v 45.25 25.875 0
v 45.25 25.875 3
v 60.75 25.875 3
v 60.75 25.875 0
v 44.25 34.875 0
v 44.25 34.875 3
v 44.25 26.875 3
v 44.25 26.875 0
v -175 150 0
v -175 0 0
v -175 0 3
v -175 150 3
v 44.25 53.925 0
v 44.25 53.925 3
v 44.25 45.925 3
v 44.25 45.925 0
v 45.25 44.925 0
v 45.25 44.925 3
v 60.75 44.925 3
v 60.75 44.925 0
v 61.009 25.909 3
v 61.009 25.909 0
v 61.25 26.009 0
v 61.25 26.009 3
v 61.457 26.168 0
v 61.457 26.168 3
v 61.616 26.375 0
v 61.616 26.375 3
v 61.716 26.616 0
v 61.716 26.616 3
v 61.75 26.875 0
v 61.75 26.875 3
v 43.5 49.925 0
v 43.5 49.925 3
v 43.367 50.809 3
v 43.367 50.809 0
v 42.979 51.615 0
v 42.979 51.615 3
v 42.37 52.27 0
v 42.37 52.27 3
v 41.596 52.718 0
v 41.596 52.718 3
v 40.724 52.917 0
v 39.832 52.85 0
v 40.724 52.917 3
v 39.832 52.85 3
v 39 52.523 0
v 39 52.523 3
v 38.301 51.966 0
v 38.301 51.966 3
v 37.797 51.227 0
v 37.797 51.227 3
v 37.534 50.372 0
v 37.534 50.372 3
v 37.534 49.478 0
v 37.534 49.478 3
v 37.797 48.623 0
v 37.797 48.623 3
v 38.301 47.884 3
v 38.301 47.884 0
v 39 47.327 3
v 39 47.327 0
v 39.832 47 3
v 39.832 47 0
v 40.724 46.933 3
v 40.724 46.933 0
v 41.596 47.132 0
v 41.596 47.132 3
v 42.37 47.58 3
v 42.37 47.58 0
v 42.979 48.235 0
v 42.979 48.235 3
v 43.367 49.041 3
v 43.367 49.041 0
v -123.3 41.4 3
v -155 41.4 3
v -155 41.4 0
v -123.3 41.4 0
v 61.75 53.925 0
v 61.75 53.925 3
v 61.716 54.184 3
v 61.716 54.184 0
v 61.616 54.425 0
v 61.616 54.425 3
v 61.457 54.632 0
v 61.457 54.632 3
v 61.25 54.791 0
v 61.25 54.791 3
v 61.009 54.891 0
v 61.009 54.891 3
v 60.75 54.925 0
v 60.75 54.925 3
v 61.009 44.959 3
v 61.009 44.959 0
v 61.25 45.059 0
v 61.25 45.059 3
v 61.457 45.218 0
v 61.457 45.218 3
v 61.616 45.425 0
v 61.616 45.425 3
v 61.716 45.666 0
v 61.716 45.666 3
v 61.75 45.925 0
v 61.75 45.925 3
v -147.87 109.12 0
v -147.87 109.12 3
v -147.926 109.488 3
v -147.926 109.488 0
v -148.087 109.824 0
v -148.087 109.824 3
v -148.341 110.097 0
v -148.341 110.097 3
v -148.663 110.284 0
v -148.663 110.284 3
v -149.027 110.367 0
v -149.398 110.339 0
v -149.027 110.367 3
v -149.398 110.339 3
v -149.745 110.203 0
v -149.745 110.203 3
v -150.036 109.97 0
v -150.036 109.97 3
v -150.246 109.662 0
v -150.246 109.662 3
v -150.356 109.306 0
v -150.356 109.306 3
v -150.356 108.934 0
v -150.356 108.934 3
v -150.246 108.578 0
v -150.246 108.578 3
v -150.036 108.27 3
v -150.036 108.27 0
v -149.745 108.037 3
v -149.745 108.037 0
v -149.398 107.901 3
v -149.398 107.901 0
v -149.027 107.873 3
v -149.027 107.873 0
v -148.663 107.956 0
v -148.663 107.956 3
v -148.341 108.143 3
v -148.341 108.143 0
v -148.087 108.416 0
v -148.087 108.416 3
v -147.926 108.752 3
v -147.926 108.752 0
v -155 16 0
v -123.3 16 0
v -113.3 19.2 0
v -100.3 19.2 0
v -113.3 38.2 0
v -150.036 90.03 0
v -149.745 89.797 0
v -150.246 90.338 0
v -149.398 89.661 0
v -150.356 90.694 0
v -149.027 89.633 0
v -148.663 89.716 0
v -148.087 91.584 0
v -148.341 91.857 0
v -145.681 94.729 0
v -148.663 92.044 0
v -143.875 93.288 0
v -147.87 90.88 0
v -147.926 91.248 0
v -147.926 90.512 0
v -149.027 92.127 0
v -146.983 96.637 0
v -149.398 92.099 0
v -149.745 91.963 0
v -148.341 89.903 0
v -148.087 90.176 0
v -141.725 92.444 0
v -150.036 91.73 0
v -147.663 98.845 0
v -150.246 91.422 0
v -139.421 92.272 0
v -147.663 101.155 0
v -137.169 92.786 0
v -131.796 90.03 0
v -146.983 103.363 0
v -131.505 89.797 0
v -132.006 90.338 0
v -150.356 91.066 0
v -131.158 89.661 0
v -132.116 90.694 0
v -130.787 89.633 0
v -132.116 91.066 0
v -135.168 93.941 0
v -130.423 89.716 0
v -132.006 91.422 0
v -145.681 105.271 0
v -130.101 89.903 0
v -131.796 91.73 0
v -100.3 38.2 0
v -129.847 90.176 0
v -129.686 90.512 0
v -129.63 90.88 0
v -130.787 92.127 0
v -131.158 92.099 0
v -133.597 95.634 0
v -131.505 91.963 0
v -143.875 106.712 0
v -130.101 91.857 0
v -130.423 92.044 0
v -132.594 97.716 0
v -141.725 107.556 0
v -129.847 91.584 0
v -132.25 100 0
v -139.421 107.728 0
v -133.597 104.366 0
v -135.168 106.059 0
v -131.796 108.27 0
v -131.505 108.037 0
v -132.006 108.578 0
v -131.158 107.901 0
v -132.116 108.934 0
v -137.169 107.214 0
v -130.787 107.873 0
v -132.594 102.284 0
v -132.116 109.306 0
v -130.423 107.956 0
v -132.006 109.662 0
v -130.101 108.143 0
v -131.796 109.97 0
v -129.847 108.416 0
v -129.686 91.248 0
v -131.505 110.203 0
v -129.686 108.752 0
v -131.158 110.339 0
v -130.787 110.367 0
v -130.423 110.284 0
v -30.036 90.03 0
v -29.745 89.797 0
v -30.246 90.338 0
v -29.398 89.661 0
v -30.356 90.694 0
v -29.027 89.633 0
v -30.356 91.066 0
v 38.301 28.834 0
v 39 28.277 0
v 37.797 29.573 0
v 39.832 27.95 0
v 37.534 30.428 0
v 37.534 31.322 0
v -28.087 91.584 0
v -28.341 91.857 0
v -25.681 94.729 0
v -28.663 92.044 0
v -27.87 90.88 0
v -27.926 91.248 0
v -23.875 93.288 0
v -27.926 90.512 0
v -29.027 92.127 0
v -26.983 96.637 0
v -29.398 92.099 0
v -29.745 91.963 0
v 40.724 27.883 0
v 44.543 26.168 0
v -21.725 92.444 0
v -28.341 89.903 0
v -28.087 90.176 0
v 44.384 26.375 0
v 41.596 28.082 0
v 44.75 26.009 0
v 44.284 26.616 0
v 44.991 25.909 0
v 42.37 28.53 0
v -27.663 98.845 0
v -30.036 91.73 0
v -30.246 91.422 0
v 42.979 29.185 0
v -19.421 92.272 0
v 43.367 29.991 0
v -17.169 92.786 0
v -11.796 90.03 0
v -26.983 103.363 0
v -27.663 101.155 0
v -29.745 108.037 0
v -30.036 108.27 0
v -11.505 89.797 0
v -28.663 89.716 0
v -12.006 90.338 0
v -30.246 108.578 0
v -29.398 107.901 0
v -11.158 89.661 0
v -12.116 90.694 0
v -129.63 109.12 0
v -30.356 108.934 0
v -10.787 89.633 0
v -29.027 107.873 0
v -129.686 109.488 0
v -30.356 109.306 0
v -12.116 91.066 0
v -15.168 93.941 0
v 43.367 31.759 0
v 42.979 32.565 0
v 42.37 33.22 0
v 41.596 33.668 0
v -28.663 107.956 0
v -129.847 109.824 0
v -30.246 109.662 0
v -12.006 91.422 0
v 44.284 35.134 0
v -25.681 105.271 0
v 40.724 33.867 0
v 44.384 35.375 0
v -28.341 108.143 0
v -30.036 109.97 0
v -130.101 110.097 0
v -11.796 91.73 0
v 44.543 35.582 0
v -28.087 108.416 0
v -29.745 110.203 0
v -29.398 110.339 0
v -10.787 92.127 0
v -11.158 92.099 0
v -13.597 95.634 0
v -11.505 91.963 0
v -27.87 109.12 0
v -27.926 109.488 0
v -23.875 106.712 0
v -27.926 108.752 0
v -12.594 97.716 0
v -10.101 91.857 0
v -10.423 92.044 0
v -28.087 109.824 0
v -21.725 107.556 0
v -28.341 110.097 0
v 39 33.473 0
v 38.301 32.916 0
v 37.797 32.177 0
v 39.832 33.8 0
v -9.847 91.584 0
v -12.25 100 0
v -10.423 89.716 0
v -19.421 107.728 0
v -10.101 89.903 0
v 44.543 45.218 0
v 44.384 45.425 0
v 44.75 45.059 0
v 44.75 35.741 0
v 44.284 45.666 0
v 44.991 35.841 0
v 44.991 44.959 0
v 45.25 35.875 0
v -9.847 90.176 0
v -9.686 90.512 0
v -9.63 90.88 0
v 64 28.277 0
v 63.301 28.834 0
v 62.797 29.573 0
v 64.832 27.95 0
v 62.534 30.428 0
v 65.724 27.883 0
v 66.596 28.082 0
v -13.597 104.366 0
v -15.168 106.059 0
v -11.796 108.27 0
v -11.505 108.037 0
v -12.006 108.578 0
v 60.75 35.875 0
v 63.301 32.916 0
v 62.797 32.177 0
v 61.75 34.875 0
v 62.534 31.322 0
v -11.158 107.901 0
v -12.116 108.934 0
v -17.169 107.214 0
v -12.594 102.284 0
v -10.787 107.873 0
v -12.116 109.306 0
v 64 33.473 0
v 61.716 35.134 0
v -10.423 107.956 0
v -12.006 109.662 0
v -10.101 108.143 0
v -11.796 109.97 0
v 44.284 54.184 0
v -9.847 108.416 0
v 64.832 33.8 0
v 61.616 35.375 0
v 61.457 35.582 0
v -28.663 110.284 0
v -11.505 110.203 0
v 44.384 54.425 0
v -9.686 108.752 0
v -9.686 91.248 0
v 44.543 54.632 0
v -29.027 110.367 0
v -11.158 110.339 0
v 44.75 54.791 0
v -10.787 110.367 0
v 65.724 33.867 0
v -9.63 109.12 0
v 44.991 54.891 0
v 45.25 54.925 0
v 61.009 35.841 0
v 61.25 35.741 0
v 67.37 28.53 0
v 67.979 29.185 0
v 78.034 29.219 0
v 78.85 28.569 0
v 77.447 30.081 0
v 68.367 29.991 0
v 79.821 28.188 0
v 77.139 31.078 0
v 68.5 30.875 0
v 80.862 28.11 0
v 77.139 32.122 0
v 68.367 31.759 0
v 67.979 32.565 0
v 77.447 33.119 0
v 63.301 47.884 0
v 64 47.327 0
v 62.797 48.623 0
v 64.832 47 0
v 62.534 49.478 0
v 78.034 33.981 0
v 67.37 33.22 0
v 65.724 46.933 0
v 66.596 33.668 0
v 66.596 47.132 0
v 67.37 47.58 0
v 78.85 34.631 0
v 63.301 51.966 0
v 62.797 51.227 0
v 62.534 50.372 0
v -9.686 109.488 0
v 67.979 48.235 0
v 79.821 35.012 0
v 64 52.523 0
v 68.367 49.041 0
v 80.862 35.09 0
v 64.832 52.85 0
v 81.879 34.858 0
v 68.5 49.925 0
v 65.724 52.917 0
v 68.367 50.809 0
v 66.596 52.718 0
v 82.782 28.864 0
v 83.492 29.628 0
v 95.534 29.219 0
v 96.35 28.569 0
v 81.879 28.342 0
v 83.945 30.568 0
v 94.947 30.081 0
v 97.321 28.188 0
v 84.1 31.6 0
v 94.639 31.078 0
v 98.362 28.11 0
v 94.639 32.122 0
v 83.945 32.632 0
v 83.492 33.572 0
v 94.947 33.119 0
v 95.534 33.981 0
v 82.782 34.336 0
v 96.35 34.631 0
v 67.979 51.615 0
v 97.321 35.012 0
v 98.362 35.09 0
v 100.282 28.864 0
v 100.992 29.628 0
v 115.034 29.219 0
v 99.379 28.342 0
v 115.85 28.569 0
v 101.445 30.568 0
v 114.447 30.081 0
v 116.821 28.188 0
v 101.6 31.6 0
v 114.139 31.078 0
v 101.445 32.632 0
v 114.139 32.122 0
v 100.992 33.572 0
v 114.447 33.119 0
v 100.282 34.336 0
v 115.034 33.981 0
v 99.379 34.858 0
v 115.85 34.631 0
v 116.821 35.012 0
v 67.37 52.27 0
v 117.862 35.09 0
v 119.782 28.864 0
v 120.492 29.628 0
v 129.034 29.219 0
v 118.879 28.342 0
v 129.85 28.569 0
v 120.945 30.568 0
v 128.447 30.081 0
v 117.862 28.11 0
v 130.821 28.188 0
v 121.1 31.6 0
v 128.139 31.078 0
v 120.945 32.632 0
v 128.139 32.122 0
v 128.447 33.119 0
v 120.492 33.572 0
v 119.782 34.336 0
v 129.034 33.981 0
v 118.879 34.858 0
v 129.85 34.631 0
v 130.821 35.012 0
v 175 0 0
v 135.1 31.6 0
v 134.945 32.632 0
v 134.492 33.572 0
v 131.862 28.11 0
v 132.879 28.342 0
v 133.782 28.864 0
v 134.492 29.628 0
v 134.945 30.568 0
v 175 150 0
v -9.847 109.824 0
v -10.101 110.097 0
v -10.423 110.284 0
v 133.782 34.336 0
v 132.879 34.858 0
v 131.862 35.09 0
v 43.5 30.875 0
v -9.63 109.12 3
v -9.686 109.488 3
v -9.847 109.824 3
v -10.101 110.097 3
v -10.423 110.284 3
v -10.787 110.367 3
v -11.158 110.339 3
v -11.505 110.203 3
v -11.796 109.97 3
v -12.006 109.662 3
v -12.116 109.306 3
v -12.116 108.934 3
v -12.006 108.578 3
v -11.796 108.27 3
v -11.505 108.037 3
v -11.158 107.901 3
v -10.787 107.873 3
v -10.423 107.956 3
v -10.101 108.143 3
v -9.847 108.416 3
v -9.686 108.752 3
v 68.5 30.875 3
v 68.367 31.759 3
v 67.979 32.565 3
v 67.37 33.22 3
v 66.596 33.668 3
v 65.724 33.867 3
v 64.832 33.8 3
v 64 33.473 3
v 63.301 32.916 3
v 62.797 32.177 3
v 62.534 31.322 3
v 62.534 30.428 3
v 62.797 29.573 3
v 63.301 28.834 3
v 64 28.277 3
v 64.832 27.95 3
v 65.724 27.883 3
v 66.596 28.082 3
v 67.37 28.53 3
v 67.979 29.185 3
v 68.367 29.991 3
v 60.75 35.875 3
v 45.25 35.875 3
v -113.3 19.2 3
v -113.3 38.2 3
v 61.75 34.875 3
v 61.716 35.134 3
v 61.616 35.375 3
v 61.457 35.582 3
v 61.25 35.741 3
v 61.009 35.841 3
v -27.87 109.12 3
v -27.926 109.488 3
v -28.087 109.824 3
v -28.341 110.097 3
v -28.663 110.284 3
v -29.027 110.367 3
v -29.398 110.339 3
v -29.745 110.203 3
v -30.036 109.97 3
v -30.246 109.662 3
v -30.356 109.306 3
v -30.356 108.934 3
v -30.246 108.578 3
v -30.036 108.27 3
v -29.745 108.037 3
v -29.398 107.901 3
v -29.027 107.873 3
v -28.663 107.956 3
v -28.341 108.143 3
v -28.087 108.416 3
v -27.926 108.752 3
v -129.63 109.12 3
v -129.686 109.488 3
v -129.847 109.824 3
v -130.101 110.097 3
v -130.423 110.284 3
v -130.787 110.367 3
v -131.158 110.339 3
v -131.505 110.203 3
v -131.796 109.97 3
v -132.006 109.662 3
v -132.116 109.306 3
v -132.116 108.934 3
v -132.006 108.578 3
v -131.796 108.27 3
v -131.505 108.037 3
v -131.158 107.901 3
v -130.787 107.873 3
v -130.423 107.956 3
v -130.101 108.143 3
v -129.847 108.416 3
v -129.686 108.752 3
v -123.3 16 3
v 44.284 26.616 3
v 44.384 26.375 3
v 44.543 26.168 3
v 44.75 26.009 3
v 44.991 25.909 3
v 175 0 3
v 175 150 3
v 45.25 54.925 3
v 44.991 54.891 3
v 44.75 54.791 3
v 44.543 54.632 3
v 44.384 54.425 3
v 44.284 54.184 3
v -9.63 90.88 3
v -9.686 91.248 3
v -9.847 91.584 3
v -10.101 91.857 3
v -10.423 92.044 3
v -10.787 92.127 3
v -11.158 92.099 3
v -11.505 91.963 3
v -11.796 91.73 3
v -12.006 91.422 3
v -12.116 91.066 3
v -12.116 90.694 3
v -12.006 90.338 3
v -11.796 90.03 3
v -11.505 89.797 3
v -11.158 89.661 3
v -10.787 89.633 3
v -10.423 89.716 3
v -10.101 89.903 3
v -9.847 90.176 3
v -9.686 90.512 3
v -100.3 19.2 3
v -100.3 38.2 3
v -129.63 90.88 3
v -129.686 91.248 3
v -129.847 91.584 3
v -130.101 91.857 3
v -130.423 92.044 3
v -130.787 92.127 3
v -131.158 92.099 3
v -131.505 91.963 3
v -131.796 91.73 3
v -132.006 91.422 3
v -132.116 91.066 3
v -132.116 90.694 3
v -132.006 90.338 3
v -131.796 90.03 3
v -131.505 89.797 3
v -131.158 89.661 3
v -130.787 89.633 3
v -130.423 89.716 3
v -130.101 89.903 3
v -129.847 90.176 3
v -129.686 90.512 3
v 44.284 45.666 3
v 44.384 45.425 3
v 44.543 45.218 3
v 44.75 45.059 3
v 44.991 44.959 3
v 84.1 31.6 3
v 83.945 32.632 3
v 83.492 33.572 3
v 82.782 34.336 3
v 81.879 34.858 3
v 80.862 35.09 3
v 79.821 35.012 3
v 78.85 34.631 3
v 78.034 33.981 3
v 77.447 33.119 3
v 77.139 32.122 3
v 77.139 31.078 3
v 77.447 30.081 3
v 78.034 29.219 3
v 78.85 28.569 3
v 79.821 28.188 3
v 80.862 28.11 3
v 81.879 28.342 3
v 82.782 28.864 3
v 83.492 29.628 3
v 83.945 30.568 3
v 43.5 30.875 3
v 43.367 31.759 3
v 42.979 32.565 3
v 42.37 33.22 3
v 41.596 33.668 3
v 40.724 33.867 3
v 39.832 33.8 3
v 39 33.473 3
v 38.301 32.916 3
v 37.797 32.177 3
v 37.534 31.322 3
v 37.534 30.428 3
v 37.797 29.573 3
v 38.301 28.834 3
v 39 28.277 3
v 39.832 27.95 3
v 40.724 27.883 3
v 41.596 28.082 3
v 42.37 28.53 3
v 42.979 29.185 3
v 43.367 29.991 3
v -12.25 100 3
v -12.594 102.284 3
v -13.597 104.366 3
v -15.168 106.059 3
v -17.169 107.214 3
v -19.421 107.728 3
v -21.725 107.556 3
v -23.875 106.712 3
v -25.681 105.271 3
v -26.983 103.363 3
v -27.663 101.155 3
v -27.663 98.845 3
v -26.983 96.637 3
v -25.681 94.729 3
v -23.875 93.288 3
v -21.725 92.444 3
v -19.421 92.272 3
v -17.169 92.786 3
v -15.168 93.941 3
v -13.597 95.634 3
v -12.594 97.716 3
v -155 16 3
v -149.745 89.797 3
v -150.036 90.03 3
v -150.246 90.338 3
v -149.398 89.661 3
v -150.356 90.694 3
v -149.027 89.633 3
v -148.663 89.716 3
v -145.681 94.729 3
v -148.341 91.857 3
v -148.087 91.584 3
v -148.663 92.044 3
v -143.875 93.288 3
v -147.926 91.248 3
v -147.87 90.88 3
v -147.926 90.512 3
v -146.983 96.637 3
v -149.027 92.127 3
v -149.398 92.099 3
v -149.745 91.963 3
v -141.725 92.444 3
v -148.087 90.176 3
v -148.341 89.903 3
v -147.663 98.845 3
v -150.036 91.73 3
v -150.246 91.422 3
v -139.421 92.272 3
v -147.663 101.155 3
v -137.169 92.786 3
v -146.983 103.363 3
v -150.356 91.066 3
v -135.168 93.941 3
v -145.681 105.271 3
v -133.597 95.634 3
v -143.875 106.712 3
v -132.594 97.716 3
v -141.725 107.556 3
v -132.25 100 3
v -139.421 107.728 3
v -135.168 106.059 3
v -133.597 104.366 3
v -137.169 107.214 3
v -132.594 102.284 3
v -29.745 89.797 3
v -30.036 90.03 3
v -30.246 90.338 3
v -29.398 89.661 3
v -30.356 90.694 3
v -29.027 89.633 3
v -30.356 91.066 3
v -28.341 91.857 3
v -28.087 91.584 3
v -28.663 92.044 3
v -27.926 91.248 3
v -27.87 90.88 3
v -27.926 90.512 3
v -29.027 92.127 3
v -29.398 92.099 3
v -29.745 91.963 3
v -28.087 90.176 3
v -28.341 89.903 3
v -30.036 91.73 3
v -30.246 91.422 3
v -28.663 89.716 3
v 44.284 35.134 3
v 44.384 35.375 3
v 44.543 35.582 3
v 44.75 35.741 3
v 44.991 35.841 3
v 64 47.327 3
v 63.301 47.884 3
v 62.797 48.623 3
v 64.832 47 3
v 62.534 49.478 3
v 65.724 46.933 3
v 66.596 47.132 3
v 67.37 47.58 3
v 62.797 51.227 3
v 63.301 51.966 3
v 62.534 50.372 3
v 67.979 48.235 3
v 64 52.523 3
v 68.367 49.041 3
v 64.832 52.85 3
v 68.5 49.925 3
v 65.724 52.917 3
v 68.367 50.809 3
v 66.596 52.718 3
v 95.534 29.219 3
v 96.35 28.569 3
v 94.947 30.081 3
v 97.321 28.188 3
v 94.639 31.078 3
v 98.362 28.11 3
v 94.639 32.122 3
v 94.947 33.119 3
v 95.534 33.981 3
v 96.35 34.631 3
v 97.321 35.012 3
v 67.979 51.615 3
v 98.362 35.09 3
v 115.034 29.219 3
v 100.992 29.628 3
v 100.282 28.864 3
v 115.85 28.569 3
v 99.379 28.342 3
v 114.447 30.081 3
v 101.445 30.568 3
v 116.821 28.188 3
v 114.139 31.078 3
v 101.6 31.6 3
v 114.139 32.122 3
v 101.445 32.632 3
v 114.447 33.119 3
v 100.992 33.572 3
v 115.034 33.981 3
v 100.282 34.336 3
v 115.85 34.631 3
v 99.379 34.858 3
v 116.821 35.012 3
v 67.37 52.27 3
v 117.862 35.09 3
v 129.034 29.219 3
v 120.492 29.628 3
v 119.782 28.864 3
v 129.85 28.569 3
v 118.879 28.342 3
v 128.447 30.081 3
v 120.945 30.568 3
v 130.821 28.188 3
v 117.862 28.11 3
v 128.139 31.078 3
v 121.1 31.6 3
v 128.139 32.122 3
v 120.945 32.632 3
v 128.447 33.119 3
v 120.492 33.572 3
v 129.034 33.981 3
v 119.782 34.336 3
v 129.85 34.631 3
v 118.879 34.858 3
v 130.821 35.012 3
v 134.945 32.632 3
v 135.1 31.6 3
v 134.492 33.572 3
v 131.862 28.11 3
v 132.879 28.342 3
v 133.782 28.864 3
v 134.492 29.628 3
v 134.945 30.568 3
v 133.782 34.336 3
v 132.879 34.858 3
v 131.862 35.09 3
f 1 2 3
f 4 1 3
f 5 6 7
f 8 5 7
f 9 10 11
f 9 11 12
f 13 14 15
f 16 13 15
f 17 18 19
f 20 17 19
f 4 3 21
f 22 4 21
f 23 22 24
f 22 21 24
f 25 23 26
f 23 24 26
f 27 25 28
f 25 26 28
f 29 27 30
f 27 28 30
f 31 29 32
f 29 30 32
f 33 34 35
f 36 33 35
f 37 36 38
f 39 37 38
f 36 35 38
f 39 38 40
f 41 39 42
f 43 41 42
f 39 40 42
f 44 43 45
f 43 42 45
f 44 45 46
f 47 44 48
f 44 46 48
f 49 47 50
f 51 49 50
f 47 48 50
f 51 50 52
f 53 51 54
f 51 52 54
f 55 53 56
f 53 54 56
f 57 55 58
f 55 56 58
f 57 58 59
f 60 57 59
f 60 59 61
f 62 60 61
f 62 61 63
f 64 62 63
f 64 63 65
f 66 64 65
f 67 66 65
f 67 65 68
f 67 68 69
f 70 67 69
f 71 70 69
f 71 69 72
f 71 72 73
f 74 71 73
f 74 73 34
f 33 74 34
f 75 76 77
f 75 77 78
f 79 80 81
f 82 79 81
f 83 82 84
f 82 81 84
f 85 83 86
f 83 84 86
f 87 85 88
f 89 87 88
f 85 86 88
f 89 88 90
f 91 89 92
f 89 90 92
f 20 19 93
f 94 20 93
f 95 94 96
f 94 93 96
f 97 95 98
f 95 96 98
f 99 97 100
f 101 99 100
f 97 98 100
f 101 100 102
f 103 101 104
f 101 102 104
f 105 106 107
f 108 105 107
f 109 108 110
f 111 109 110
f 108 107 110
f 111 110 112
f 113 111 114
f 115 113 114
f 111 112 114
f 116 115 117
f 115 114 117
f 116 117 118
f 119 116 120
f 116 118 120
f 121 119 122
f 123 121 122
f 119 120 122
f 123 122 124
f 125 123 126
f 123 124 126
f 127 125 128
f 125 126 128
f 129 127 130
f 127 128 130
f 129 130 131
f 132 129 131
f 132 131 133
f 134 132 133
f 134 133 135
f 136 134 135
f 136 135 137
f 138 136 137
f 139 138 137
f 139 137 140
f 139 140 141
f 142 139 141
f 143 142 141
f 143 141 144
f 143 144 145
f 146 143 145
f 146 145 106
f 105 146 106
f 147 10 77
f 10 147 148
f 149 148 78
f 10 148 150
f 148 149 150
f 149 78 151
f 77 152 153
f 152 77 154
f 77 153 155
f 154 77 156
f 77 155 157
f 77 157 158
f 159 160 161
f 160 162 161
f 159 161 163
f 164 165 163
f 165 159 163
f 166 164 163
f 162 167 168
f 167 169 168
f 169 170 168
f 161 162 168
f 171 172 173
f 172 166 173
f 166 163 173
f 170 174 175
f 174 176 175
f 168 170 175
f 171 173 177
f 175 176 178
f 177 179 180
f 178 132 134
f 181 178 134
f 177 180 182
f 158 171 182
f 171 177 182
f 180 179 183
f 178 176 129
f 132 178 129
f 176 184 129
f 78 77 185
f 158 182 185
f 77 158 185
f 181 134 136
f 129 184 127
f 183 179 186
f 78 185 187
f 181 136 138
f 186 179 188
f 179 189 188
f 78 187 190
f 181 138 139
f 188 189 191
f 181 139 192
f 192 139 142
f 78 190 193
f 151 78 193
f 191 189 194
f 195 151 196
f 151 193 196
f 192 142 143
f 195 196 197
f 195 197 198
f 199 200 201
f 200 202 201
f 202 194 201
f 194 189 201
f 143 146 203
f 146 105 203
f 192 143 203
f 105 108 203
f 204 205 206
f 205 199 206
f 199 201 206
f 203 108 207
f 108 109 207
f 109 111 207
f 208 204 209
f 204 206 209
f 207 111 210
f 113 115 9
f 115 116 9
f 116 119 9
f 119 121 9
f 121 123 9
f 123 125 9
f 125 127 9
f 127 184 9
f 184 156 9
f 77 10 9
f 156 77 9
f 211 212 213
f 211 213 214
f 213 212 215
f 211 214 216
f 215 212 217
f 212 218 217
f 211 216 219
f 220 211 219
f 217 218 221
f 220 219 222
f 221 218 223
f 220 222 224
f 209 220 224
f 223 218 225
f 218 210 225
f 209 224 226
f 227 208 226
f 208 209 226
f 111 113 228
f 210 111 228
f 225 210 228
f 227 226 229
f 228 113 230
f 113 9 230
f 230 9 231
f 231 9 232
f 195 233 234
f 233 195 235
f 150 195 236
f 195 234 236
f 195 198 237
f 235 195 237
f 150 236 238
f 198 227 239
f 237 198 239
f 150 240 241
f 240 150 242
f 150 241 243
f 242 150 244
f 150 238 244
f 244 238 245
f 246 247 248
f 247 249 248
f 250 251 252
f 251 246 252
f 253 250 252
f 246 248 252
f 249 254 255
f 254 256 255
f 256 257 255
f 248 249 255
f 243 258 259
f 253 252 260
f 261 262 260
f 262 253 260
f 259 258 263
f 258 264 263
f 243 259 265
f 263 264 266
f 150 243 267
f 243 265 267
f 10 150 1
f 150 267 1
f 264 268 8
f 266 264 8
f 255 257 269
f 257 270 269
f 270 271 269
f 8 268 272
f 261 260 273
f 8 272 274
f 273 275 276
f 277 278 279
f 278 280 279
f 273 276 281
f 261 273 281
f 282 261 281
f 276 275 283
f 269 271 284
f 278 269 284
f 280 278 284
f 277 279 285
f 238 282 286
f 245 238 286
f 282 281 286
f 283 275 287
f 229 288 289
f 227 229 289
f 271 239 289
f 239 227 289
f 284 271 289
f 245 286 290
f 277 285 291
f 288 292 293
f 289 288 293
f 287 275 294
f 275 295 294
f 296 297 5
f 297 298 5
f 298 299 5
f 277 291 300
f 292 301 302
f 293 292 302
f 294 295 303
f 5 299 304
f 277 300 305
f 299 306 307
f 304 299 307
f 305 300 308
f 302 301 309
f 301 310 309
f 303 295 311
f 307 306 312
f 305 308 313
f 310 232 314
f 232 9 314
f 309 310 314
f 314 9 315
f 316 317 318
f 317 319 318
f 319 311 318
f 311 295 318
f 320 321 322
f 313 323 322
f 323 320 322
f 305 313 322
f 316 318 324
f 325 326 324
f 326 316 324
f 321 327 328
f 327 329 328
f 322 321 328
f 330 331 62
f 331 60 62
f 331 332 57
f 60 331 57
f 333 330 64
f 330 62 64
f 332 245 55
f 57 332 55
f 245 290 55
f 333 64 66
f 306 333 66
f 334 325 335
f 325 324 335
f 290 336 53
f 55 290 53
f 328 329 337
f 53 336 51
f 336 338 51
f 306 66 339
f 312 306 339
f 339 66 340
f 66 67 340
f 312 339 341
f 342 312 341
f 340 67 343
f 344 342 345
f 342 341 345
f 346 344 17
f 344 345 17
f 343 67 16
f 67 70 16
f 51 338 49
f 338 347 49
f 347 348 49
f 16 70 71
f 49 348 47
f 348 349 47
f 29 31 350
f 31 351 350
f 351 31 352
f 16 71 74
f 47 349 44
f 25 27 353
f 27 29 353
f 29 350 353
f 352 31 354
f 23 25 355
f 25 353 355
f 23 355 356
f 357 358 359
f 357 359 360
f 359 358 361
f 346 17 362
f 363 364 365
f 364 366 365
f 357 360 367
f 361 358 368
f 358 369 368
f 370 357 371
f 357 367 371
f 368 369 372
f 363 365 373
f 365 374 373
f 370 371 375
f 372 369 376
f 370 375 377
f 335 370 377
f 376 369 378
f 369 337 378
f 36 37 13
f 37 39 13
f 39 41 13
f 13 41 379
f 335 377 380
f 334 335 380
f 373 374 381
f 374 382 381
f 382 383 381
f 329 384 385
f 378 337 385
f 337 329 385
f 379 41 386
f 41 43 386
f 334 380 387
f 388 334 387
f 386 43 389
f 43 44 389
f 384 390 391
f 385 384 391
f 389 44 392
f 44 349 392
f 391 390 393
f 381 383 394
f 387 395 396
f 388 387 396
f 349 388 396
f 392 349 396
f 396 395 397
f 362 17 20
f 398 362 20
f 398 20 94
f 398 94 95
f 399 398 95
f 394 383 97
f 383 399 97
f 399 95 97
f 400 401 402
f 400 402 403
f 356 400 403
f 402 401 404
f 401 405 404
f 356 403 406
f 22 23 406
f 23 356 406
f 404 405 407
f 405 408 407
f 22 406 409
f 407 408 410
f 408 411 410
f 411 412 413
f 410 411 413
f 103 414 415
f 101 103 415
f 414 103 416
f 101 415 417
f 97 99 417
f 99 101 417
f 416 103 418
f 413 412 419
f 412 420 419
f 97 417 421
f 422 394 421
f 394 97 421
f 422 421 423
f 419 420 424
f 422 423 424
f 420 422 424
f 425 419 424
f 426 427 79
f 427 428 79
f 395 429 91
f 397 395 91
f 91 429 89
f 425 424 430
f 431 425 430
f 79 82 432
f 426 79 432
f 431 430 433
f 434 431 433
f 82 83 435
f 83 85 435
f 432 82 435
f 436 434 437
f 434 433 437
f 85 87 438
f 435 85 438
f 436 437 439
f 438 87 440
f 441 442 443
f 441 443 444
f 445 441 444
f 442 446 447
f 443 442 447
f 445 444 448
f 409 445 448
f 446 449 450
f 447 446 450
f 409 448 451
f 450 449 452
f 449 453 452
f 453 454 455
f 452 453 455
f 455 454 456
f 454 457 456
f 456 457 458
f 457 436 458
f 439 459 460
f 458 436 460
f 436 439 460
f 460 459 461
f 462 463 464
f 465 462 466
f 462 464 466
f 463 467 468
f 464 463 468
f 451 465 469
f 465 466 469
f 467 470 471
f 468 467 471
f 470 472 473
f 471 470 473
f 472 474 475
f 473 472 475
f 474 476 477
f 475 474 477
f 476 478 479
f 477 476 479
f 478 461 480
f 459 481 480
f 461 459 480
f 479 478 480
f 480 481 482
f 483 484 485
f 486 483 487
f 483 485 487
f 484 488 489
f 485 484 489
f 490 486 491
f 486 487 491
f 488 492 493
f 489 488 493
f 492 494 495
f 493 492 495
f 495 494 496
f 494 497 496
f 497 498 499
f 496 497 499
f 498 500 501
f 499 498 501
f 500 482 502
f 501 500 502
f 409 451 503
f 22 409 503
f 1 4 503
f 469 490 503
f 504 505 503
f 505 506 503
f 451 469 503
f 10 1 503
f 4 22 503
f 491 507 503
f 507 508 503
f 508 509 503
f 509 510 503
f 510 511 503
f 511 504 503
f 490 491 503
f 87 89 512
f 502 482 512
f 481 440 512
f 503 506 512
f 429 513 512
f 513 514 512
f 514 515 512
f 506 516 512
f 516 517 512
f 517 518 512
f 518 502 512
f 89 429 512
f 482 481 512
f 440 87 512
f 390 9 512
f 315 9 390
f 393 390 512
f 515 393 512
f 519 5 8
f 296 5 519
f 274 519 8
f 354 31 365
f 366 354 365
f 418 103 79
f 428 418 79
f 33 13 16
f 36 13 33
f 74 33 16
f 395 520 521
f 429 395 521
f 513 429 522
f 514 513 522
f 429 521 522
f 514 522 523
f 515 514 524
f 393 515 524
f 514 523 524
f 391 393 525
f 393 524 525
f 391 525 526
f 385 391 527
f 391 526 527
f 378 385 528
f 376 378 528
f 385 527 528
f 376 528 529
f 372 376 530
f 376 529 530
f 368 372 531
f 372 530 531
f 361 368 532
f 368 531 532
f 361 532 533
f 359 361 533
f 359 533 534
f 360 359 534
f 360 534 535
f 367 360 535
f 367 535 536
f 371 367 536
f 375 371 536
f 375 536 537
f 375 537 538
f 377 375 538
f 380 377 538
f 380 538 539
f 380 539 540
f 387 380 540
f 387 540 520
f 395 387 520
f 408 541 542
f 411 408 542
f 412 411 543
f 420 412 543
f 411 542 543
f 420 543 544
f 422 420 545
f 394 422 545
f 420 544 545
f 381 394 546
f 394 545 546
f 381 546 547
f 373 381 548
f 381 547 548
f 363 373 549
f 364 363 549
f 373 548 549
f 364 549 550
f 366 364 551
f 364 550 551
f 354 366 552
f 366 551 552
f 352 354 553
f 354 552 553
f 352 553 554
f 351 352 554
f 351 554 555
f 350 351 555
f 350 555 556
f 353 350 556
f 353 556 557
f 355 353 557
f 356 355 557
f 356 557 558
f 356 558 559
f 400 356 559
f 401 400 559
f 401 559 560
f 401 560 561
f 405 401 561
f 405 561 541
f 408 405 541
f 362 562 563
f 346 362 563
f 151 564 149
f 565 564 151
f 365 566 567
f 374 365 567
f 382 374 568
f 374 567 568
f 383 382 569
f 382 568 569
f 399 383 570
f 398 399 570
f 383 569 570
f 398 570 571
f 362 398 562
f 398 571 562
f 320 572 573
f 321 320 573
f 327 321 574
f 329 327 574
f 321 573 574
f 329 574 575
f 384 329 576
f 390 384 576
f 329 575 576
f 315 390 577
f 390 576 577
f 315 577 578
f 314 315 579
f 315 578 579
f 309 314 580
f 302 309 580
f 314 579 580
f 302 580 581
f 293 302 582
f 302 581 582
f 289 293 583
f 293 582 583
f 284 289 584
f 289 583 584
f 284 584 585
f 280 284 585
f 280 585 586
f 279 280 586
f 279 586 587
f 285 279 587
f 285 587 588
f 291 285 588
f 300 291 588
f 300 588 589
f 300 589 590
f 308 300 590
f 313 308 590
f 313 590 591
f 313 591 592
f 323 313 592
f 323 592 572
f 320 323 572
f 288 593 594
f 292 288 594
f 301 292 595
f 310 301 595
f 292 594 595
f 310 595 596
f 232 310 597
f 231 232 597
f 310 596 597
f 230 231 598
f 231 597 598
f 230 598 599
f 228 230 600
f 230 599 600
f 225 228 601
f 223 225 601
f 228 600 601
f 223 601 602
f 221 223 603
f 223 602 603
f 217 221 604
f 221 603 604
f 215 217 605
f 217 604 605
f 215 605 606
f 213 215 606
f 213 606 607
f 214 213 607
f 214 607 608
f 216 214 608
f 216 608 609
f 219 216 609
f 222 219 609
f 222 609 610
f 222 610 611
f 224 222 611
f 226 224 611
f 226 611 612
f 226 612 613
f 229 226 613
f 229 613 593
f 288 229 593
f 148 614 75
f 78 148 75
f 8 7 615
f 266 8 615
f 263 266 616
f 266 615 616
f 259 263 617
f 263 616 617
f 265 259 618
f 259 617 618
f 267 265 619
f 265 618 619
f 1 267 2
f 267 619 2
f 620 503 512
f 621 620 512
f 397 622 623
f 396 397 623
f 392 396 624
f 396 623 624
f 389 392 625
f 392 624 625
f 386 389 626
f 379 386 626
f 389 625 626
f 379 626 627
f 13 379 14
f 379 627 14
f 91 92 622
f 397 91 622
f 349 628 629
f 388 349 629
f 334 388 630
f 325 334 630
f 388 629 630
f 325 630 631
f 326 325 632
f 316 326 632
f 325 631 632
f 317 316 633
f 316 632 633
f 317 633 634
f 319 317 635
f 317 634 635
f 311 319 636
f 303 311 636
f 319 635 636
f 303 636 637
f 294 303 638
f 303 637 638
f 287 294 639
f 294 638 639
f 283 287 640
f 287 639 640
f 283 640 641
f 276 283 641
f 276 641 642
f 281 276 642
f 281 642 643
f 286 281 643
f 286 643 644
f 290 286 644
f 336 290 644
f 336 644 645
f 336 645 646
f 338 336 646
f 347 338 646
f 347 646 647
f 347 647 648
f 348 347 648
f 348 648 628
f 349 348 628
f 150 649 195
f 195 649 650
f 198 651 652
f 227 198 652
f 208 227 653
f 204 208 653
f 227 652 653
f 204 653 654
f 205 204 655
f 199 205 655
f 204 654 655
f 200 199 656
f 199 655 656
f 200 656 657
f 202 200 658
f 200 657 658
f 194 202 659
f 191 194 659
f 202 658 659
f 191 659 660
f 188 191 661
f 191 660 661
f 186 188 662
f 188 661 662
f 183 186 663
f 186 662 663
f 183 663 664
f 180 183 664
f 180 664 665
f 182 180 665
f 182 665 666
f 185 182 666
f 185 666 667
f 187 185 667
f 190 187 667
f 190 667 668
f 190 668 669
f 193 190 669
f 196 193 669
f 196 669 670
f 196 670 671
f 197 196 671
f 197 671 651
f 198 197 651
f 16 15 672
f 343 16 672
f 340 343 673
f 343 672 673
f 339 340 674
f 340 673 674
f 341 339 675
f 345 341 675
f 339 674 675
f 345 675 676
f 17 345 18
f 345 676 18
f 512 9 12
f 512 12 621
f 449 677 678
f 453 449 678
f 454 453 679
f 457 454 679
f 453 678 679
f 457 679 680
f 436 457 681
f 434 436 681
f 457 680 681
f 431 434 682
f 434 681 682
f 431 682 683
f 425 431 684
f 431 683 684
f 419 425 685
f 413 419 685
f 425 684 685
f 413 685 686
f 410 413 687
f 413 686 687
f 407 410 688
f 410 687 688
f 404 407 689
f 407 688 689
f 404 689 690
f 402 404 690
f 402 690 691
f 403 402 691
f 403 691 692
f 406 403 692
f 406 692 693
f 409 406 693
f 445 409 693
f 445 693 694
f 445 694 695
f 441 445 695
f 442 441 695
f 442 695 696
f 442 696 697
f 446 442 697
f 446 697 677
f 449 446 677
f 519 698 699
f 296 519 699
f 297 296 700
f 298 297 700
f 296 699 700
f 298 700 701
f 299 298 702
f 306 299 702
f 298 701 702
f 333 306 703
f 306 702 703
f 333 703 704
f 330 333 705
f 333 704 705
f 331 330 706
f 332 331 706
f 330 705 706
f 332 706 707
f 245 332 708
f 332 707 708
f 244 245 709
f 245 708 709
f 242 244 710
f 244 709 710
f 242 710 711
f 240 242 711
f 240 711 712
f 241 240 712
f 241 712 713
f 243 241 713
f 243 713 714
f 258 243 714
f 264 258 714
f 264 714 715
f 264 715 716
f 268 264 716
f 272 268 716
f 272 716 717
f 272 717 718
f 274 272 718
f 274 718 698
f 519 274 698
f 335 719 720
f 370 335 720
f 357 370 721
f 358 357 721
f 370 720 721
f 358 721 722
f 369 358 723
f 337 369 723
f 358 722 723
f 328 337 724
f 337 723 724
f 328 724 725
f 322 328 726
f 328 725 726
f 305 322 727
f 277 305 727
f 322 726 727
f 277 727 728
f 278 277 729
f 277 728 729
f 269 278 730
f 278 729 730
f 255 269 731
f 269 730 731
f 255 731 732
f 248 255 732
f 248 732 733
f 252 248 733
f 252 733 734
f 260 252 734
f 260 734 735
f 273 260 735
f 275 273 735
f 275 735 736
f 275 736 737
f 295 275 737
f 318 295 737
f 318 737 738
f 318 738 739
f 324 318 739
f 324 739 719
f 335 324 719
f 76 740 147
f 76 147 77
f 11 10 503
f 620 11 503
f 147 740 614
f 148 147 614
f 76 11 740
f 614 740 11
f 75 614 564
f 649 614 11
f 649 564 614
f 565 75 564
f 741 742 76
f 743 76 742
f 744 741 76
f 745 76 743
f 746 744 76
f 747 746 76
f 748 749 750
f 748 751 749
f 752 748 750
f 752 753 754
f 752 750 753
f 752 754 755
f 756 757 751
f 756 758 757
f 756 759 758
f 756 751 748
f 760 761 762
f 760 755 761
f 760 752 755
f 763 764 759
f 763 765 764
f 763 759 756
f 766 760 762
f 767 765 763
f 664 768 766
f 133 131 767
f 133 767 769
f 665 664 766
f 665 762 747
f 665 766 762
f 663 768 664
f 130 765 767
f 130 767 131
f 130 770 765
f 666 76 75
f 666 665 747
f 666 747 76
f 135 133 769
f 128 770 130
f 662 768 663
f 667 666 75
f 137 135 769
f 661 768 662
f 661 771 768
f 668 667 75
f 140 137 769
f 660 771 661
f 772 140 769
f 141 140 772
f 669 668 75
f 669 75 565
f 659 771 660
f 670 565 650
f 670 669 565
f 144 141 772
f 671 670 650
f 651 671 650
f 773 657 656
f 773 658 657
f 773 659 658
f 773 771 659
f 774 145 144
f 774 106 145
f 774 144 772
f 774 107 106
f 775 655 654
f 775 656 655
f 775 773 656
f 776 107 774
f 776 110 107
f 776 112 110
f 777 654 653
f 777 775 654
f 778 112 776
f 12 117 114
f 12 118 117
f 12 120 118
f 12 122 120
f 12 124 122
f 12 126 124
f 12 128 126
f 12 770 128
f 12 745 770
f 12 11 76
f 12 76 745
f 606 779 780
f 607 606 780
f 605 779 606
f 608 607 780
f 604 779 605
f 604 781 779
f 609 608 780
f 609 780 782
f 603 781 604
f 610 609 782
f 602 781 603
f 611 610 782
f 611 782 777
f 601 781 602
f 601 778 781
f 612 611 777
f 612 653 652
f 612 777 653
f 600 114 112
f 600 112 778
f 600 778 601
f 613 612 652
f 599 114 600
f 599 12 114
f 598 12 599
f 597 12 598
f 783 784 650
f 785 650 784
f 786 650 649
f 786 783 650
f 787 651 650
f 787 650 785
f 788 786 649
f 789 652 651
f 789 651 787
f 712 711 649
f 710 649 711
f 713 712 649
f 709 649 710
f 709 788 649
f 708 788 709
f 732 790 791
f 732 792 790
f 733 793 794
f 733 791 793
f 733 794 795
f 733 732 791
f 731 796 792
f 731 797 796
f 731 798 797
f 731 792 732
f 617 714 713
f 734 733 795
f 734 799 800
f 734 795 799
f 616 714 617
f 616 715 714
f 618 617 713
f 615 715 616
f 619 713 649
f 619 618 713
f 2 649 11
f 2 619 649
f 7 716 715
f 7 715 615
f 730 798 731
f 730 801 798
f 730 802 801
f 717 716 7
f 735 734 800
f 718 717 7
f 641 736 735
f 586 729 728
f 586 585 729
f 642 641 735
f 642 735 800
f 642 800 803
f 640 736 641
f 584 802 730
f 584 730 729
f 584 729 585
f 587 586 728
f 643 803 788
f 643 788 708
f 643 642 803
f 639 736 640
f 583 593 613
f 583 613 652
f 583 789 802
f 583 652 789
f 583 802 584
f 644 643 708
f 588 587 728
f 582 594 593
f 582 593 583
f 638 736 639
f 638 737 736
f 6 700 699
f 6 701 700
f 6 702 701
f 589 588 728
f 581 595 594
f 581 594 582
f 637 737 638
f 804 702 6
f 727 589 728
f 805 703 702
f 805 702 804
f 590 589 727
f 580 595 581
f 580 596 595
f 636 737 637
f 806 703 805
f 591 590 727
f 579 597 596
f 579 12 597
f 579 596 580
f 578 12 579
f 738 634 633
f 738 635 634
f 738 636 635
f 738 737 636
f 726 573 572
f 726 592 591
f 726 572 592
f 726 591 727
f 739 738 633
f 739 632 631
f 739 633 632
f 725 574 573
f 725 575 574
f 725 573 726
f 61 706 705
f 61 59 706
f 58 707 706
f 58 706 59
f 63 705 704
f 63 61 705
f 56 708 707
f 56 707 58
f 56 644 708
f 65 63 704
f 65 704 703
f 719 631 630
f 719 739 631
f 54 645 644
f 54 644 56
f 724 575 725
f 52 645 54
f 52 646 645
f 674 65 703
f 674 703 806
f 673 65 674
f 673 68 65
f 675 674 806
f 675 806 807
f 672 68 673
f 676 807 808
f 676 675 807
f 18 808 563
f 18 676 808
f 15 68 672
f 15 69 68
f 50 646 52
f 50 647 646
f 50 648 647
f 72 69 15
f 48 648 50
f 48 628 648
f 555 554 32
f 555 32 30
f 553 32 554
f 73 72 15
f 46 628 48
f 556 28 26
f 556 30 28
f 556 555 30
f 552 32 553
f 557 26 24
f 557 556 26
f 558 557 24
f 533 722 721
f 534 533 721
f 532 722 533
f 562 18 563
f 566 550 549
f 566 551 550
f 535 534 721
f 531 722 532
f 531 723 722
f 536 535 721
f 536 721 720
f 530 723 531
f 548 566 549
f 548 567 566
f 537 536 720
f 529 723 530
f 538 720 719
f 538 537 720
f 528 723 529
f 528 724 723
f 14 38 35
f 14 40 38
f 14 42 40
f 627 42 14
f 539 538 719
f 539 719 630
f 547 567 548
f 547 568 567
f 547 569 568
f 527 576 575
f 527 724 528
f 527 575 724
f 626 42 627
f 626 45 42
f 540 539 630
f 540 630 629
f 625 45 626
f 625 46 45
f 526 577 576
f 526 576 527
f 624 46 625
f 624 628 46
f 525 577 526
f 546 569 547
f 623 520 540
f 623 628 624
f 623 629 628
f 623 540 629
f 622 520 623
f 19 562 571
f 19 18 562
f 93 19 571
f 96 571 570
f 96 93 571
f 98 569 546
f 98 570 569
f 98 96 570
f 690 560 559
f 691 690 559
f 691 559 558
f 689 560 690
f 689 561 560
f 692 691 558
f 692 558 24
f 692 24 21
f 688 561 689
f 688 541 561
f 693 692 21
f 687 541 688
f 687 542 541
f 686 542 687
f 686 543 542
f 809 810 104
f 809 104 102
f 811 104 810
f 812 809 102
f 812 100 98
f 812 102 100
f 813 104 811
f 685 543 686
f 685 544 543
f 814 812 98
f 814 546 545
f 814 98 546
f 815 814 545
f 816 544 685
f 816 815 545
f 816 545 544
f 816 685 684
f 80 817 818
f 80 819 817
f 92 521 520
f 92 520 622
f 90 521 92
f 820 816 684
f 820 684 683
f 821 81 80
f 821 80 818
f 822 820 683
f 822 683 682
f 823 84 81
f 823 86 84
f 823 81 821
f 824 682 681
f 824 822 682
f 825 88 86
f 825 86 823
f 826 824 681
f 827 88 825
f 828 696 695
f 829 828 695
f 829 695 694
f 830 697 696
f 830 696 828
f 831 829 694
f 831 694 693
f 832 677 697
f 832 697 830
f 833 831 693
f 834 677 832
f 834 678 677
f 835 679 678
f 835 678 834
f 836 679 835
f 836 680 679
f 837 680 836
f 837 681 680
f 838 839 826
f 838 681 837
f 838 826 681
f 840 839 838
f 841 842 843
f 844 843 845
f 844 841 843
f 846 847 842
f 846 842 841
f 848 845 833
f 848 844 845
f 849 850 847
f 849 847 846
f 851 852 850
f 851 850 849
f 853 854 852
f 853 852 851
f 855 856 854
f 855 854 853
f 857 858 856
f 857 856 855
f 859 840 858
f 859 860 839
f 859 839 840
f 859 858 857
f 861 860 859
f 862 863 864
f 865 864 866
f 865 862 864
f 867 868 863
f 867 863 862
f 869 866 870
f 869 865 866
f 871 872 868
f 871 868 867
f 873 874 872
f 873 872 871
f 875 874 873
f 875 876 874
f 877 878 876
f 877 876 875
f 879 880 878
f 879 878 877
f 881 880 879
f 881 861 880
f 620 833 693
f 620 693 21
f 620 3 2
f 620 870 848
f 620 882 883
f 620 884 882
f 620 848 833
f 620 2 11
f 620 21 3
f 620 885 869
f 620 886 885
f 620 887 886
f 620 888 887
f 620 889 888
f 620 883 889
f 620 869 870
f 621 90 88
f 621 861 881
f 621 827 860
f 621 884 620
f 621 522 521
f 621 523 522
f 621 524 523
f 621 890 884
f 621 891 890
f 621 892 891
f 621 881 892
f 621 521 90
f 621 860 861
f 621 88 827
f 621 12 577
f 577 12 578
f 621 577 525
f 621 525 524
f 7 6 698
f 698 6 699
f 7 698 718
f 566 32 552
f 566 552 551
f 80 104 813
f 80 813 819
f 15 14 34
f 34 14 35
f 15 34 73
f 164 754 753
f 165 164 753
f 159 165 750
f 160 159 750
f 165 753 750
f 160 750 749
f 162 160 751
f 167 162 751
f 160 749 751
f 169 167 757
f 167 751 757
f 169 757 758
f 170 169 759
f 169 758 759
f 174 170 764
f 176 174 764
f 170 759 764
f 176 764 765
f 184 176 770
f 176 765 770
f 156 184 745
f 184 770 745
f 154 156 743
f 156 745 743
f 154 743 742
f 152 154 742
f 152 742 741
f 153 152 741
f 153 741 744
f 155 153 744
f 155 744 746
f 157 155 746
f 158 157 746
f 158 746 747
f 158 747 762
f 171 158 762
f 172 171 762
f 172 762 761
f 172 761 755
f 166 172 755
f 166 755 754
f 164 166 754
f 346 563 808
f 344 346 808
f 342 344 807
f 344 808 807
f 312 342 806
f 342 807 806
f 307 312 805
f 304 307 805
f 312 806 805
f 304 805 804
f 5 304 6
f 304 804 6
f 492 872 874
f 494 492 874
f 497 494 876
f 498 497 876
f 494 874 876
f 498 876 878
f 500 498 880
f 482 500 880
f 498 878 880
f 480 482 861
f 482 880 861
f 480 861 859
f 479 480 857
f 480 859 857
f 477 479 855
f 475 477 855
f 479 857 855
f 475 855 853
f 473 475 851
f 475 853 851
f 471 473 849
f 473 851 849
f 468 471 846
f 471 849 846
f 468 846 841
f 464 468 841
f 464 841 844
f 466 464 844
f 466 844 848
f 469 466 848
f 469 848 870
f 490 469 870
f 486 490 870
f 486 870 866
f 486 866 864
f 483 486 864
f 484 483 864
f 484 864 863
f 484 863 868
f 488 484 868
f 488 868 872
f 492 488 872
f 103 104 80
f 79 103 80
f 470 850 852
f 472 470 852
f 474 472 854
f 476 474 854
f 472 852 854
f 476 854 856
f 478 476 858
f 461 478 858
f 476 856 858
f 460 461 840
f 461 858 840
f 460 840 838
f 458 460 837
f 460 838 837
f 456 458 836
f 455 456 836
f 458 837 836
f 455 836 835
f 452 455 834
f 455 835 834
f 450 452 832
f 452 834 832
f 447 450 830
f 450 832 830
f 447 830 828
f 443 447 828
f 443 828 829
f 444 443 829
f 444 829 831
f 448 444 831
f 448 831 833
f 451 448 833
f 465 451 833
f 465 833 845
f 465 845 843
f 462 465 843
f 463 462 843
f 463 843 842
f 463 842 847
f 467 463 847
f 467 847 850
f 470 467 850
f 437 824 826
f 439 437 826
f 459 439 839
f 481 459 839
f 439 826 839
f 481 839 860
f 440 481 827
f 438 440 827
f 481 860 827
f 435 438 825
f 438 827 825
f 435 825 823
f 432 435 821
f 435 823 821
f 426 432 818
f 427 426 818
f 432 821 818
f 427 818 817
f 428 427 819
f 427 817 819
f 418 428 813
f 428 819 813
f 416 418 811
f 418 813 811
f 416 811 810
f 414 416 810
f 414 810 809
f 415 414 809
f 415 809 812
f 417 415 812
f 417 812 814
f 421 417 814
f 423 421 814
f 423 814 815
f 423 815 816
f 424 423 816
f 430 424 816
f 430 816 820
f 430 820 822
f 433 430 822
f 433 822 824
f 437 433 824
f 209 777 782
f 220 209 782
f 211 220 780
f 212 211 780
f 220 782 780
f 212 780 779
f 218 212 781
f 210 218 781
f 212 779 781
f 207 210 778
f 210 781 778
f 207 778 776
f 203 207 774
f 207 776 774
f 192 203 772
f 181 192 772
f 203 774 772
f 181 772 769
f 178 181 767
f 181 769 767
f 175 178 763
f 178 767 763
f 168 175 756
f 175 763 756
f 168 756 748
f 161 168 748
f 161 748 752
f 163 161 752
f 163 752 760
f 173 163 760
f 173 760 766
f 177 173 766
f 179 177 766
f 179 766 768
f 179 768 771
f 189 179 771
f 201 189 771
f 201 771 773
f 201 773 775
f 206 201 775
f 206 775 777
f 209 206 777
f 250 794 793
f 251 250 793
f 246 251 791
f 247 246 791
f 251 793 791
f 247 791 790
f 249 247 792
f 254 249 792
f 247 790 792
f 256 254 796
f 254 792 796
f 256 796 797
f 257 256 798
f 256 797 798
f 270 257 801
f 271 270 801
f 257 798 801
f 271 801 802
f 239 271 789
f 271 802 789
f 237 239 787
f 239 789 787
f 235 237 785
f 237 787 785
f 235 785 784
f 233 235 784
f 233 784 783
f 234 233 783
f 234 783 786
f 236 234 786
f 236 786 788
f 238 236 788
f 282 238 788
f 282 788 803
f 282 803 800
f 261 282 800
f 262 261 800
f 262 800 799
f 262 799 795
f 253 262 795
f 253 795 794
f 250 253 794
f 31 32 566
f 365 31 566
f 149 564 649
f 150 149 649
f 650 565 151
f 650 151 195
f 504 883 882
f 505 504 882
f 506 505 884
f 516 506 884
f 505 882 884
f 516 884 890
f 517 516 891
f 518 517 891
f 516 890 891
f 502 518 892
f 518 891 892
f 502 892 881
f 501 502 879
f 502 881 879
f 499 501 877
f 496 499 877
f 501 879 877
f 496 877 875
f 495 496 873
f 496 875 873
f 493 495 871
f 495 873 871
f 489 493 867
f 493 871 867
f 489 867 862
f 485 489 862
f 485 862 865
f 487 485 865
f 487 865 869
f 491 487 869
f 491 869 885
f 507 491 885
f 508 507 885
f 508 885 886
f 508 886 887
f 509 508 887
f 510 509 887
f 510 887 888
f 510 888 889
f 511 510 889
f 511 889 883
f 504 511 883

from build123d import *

# Parameters (mm, degrees)
SKETCH_2_W          = 350
SKETCH_2_H          = 150
EXTRUDE_1_DEPTH     = 3
SKETCH_3_R          = 3
SKETCH_3_R_2        = 3.5
SKETCH_3_R_3        = 1.25
SKETCH_3_R_4        = 7.75
SKETCH_3_W          = 31.7
SKETCH_3_H          = 25.4
SKETCH_3_W_2        = 13
SKETCH_3_H_2        = 19
CUT_EXTRUDE_1_DEPTH = 231.508134347


with BuildPart() as part:
    # 草图2 → 凸台-拉伸1 (new body)
    with BuildSketch(Plane.XY):
        with Locations((0, 75)):
            Rectangle(SKETCH_2_W, SKETCH_2_H)
    extrude(amount=EXTRUDE_1_DEPTH)

    # 草图3 → 切除-拉伸1 (cut, through all)
    with BuildSketch(Plane.XY.offset(3)):
        with Locations((40.5, 30.875)):
            Circle(SKETCH_3_R)
        with Locations((65.5, 30.875)):
            Circle(SKETCH_3_R)
        with Locations((80.6, 31.6)):
            Circle(SKETCH_3_R_2)
        with Locations((98.1, 31.6)):
            Circle(SKETCH_3_R_2)
        with Locations((117.6, 31.6)):
            Circle(SKETCH_3_R_2)
        with Locations((131.6, 31.6)):
            Circle(SKETCH_3_R_2)
        with Locations((-149.12, 109.12)):
            Circle(SKETCH_3_R_3)
        with Locations((-130.88, 109.12)):
            Circle(SKETCH_3_R_3)
        with Locations((-149.12, 90.88)):
            Circle(SKETCH_3_R_3)
        with Locations((-130.88, 90.88)):
            Circle(SKETCH_3_R_3)
        with Locations((-140, 100)):
            Circle(SKETCH_3_R_4)
        with Locations((-29.12, 90.88)):
            Circle(SKETCH_3_R_3)
        with Locations((-10.88, 90.88)):
            Circle(SKETCH_3_R_3)
        with Locations((-20, 100)):
            Circle(SKETCH_3_R_4)
        with Locations((-29.12, 109.12)):
            Circle(SKETCH_3_R_3)
        with Locations((-10.88, 109.12)):
            Circle(SKETCH_3_R_3)
        with Locations((65.5, 49.925)):
            Circle(SKETCH_3_R)
        with Locations((40.5, 49.925)):
            Circle(SKETCH_3_R)
        with BuildLine():
            Line((61.75, 45.925), (61.75, 53.925))
            ThreePointArc((61.75, 53.925), (61.457106781, 54.632106781), (60.75, 54.925))
            Line((60.75, 54.925), (45.25, 54.925))
            ThreePointArc((45.25, 54.925), (44.542893219, 54.632106781), (44.25, 53.925))
            Line((44.25, 53.925), (44.25, 45.925))
            ThreePointArc((44.25, 45.925), (44.542893219, 45.217893219), (45.25, 44.925))
            Line((45.25, 44.925), (60.75, 44.925))
            ThreePointArc((60.75, 44.925), (61.457106781, 45.217893219), (61.75, 45.925))
        make_face()
        with BuildLine():
            Line((45.25, 25.875), (60.75, 25.875))
            ThreePointArc((60.75, 25.875), (61.457106781, 26.167893219), (61.75, 26.875))
            Line((61.75, 26.875), (61.75, 34.875))
            ThreePointArc((61.75, 34.875), (61.457106781, 35.582106781), (60.75, 35.875))
            Line((60.75, 35.875), (45.25, 35.875))
            ThreePointArc((45.25, 35.875), (44.542893219, 35.582106781), (44.25, 34.875))
            Line((44.25, 34.875), (44.25, 26.875))
            ThreePointArc((44.25, 26.875), (44.542893219, 26.167893219), (45.25, 25.875))
        make_face()
        with Locations((-139.15, 28.7)):
            Rectangle(SKETCH_3_W, SKETCH_3_H)
        with Locations((-106.8, 28.7)):
            Rectangle(SKETCH_3_W_2, SKETCH_3_H_2)
    extrude(amount=-CUT_EXTRUDE_1_DEPTH, mode=Mode.SUBTRACT)


solid = part.part
